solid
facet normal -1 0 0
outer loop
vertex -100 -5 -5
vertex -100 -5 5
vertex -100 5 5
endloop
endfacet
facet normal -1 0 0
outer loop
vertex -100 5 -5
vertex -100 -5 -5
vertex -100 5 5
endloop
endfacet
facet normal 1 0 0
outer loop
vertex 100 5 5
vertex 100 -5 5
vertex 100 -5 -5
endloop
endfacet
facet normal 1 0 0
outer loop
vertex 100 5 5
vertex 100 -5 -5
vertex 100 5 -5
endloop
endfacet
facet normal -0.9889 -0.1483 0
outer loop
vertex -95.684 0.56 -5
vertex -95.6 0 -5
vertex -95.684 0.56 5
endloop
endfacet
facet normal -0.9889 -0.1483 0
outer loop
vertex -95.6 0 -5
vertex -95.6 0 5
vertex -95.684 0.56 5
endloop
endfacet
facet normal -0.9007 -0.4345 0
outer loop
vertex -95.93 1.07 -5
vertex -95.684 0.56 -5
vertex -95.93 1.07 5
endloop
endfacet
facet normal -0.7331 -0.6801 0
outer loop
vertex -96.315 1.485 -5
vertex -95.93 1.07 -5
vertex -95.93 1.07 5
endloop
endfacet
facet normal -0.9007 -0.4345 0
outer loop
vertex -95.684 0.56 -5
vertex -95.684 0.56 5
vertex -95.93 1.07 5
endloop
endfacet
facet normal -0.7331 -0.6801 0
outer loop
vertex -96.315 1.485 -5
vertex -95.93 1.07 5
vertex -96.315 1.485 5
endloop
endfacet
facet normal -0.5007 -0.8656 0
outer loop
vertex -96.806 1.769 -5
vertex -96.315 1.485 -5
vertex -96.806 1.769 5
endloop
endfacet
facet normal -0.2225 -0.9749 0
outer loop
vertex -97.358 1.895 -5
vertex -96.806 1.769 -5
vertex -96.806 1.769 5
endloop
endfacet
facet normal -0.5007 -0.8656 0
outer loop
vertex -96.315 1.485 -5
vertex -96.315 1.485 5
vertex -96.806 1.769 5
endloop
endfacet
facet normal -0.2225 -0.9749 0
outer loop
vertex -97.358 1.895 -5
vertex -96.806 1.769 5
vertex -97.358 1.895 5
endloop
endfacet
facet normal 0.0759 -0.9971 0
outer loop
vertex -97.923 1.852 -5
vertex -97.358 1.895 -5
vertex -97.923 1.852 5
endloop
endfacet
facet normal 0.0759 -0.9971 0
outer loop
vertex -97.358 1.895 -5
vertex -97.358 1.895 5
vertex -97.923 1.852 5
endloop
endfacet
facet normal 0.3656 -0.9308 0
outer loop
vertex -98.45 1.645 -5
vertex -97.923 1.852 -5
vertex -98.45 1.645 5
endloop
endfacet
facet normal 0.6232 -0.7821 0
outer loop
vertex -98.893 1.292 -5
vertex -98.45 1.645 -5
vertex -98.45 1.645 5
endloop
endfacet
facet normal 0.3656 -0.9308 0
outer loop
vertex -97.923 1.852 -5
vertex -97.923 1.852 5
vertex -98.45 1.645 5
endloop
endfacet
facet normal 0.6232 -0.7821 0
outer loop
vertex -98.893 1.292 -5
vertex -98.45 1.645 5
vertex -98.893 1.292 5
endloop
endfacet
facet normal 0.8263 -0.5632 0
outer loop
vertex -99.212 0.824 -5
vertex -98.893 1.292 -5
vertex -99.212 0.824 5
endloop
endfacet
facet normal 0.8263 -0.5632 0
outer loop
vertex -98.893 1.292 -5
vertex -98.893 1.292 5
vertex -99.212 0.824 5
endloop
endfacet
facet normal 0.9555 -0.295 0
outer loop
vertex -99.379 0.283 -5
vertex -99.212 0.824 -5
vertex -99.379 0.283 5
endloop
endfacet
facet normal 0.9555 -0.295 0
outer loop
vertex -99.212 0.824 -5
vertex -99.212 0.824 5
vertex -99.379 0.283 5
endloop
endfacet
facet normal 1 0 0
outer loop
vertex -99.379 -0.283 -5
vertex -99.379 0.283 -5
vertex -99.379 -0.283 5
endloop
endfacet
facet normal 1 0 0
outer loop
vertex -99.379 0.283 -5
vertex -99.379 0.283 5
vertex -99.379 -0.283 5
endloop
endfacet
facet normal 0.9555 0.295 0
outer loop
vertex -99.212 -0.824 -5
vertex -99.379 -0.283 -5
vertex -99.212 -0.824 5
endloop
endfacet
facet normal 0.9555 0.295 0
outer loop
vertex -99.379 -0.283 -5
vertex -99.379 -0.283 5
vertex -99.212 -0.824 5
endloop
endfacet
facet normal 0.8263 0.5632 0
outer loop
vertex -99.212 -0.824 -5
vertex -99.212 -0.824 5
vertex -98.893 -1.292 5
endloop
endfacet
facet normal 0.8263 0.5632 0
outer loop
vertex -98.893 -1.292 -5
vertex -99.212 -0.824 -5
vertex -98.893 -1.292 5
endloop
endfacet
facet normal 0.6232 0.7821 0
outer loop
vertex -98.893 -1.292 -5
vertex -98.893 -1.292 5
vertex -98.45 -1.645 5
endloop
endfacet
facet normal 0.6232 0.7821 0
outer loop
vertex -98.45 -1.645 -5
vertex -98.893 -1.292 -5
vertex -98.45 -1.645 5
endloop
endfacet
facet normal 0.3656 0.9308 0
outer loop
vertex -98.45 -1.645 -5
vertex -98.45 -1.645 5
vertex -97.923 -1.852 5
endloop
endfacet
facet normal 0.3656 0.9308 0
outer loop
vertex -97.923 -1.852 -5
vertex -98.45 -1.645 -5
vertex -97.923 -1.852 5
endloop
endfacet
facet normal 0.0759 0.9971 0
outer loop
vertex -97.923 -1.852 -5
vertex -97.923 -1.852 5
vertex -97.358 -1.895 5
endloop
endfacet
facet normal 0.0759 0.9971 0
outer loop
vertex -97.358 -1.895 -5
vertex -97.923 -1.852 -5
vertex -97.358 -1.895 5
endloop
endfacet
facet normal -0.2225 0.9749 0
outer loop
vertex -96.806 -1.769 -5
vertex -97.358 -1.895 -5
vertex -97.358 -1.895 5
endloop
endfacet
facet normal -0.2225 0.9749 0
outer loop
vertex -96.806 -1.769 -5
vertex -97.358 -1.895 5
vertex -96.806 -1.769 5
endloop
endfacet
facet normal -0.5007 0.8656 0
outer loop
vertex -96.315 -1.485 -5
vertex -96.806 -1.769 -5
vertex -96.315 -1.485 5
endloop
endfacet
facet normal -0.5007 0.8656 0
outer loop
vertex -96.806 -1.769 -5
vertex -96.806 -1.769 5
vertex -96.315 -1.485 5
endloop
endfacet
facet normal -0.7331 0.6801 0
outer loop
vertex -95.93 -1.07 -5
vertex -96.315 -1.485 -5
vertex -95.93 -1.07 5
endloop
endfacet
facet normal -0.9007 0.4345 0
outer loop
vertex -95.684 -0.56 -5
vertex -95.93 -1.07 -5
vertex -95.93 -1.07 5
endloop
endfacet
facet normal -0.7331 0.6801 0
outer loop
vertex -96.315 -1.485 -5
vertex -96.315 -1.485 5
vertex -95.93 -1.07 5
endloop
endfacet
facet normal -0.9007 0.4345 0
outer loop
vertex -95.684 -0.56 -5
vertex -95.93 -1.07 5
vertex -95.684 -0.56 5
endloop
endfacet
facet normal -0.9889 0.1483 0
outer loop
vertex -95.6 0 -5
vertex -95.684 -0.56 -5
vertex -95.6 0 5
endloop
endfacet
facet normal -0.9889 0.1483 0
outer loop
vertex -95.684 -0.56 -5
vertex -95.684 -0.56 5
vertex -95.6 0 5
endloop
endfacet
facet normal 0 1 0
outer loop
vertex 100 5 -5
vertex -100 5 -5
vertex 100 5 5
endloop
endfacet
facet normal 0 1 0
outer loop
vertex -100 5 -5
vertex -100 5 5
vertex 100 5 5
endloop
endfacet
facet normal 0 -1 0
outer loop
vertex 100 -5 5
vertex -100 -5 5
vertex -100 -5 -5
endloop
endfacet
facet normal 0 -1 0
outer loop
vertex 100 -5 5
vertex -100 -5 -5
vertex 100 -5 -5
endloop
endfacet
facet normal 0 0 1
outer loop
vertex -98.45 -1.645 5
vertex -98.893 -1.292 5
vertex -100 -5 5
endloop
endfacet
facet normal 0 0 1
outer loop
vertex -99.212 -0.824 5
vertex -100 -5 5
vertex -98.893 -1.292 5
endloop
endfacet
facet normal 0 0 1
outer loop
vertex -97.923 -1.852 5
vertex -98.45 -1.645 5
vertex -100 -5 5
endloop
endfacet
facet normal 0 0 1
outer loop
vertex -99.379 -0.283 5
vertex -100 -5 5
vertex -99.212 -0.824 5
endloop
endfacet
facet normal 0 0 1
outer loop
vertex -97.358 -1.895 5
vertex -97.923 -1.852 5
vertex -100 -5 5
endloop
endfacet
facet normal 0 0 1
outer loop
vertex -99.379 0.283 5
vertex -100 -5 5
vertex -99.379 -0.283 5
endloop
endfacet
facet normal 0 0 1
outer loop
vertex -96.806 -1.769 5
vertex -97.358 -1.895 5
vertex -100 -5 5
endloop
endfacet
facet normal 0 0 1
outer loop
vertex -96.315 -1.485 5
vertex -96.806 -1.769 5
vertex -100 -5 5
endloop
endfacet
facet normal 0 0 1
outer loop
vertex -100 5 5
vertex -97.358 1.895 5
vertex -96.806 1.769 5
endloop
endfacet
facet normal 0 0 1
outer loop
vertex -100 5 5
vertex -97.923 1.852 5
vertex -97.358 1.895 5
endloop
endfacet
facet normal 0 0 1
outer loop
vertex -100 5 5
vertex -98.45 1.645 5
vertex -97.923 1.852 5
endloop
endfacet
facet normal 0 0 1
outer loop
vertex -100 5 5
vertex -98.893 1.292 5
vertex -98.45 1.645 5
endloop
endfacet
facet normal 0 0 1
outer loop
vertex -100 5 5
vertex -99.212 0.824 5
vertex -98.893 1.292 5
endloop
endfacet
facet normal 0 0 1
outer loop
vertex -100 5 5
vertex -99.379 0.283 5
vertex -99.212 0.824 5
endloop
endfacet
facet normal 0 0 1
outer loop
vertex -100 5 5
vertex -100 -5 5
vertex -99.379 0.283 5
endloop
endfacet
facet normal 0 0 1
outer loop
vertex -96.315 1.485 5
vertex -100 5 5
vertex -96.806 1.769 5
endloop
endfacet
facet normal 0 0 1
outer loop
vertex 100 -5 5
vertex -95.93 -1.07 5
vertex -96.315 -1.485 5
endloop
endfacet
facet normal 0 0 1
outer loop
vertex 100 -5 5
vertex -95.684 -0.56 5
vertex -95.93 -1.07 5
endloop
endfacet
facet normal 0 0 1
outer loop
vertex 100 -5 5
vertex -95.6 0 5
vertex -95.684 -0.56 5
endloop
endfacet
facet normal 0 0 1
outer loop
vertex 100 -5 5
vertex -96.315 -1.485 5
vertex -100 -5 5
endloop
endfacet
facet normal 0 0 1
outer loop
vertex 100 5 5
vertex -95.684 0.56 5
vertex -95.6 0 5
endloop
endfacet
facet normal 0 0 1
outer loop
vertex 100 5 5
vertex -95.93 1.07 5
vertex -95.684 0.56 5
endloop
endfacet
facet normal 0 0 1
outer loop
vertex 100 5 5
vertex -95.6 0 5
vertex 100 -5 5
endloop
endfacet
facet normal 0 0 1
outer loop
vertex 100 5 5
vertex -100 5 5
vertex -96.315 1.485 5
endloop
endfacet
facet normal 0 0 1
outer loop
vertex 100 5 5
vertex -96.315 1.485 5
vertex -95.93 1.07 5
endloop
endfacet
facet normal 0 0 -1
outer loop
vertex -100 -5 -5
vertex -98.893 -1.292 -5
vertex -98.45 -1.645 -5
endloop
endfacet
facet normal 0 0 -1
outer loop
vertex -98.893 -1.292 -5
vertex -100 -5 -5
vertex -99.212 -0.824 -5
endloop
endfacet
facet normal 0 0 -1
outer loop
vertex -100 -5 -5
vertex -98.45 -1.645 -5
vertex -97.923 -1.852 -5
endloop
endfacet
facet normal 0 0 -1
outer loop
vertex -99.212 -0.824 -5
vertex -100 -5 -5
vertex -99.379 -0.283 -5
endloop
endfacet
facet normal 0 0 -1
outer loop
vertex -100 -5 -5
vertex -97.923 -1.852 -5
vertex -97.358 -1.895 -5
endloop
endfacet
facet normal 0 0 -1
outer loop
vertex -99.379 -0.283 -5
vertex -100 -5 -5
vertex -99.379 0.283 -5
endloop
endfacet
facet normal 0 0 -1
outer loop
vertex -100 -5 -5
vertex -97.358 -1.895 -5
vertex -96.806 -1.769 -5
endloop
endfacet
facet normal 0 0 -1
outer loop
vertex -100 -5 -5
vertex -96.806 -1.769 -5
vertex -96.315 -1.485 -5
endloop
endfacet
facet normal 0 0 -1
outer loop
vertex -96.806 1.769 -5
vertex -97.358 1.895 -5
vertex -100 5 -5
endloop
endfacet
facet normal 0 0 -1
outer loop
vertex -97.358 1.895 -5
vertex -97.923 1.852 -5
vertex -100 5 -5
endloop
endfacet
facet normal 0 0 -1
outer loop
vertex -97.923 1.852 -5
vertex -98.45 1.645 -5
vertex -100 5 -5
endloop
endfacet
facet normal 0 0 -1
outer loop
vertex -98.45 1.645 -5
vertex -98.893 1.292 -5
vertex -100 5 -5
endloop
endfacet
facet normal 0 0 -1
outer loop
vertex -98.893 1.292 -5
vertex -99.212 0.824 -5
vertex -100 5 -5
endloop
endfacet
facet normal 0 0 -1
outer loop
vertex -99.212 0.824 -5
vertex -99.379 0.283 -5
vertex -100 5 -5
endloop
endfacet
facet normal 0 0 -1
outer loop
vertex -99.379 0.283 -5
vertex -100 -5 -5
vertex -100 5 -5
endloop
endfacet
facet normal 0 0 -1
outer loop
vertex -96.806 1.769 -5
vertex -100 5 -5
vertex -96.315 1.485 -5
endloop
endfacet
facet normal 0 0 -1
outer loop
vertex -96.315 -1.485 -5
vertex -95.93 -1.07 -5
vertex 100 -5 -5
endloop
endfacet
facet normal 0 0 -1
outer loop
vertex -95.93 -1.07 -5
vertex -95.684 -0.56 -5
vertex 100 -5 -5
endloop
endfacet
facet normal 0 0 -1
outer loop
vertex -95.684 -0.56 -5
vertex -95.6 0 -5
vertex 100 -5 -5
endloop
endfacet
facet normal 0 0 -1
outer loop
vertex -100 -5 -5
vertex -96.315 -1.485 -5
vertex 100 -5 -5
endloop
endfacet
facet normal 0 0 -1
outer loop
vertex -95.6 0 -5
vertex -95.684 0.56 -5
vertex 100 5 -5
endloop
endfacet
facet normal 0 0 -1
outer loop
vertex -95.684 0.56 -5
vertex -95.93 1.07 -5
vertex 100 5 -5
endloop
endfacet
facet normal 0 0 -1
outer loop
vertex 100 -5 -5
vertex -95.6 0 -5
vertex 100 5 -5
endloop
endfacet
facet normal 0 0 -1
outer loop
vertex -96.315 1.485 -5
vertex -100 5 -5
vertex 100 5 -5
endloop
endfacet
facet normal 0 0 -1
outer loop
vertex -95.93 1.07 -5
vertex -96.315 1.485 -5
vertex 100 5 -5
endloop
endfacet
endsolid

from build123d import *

# Parameters (mm, degrees)
SKETCH1_W           = 200
SKETCH1_H           = 10
BOSS_EXTRUDE1_DEPTH = 5
SKETCH2_R           = 1.9
CUT_EXTRUDE1_DEPTH  = 15


with BuildPart() as part:
    # Sketch1 → Boss-Extrude1 (new, symmetric)
    with BuildSketch(Plane.XY):
        Rectangle(SKETCH1_W, SKETCH1_H)
    extrude(amount=BOSS_EXTRUDE1_DEPTH, both=True)

    # Sketch2 → Cut-Extrude1 (cut, symmetric)
    with BuildSketch(Plane.XY):
        with Locations((-97.5, 0)):
            Circle(SKETCH2_R)
    extrude(amount=CUT_EXTRUDE1_DEPTH, both=True, mode=Mode.SUBTRACT)


solid = part.part
